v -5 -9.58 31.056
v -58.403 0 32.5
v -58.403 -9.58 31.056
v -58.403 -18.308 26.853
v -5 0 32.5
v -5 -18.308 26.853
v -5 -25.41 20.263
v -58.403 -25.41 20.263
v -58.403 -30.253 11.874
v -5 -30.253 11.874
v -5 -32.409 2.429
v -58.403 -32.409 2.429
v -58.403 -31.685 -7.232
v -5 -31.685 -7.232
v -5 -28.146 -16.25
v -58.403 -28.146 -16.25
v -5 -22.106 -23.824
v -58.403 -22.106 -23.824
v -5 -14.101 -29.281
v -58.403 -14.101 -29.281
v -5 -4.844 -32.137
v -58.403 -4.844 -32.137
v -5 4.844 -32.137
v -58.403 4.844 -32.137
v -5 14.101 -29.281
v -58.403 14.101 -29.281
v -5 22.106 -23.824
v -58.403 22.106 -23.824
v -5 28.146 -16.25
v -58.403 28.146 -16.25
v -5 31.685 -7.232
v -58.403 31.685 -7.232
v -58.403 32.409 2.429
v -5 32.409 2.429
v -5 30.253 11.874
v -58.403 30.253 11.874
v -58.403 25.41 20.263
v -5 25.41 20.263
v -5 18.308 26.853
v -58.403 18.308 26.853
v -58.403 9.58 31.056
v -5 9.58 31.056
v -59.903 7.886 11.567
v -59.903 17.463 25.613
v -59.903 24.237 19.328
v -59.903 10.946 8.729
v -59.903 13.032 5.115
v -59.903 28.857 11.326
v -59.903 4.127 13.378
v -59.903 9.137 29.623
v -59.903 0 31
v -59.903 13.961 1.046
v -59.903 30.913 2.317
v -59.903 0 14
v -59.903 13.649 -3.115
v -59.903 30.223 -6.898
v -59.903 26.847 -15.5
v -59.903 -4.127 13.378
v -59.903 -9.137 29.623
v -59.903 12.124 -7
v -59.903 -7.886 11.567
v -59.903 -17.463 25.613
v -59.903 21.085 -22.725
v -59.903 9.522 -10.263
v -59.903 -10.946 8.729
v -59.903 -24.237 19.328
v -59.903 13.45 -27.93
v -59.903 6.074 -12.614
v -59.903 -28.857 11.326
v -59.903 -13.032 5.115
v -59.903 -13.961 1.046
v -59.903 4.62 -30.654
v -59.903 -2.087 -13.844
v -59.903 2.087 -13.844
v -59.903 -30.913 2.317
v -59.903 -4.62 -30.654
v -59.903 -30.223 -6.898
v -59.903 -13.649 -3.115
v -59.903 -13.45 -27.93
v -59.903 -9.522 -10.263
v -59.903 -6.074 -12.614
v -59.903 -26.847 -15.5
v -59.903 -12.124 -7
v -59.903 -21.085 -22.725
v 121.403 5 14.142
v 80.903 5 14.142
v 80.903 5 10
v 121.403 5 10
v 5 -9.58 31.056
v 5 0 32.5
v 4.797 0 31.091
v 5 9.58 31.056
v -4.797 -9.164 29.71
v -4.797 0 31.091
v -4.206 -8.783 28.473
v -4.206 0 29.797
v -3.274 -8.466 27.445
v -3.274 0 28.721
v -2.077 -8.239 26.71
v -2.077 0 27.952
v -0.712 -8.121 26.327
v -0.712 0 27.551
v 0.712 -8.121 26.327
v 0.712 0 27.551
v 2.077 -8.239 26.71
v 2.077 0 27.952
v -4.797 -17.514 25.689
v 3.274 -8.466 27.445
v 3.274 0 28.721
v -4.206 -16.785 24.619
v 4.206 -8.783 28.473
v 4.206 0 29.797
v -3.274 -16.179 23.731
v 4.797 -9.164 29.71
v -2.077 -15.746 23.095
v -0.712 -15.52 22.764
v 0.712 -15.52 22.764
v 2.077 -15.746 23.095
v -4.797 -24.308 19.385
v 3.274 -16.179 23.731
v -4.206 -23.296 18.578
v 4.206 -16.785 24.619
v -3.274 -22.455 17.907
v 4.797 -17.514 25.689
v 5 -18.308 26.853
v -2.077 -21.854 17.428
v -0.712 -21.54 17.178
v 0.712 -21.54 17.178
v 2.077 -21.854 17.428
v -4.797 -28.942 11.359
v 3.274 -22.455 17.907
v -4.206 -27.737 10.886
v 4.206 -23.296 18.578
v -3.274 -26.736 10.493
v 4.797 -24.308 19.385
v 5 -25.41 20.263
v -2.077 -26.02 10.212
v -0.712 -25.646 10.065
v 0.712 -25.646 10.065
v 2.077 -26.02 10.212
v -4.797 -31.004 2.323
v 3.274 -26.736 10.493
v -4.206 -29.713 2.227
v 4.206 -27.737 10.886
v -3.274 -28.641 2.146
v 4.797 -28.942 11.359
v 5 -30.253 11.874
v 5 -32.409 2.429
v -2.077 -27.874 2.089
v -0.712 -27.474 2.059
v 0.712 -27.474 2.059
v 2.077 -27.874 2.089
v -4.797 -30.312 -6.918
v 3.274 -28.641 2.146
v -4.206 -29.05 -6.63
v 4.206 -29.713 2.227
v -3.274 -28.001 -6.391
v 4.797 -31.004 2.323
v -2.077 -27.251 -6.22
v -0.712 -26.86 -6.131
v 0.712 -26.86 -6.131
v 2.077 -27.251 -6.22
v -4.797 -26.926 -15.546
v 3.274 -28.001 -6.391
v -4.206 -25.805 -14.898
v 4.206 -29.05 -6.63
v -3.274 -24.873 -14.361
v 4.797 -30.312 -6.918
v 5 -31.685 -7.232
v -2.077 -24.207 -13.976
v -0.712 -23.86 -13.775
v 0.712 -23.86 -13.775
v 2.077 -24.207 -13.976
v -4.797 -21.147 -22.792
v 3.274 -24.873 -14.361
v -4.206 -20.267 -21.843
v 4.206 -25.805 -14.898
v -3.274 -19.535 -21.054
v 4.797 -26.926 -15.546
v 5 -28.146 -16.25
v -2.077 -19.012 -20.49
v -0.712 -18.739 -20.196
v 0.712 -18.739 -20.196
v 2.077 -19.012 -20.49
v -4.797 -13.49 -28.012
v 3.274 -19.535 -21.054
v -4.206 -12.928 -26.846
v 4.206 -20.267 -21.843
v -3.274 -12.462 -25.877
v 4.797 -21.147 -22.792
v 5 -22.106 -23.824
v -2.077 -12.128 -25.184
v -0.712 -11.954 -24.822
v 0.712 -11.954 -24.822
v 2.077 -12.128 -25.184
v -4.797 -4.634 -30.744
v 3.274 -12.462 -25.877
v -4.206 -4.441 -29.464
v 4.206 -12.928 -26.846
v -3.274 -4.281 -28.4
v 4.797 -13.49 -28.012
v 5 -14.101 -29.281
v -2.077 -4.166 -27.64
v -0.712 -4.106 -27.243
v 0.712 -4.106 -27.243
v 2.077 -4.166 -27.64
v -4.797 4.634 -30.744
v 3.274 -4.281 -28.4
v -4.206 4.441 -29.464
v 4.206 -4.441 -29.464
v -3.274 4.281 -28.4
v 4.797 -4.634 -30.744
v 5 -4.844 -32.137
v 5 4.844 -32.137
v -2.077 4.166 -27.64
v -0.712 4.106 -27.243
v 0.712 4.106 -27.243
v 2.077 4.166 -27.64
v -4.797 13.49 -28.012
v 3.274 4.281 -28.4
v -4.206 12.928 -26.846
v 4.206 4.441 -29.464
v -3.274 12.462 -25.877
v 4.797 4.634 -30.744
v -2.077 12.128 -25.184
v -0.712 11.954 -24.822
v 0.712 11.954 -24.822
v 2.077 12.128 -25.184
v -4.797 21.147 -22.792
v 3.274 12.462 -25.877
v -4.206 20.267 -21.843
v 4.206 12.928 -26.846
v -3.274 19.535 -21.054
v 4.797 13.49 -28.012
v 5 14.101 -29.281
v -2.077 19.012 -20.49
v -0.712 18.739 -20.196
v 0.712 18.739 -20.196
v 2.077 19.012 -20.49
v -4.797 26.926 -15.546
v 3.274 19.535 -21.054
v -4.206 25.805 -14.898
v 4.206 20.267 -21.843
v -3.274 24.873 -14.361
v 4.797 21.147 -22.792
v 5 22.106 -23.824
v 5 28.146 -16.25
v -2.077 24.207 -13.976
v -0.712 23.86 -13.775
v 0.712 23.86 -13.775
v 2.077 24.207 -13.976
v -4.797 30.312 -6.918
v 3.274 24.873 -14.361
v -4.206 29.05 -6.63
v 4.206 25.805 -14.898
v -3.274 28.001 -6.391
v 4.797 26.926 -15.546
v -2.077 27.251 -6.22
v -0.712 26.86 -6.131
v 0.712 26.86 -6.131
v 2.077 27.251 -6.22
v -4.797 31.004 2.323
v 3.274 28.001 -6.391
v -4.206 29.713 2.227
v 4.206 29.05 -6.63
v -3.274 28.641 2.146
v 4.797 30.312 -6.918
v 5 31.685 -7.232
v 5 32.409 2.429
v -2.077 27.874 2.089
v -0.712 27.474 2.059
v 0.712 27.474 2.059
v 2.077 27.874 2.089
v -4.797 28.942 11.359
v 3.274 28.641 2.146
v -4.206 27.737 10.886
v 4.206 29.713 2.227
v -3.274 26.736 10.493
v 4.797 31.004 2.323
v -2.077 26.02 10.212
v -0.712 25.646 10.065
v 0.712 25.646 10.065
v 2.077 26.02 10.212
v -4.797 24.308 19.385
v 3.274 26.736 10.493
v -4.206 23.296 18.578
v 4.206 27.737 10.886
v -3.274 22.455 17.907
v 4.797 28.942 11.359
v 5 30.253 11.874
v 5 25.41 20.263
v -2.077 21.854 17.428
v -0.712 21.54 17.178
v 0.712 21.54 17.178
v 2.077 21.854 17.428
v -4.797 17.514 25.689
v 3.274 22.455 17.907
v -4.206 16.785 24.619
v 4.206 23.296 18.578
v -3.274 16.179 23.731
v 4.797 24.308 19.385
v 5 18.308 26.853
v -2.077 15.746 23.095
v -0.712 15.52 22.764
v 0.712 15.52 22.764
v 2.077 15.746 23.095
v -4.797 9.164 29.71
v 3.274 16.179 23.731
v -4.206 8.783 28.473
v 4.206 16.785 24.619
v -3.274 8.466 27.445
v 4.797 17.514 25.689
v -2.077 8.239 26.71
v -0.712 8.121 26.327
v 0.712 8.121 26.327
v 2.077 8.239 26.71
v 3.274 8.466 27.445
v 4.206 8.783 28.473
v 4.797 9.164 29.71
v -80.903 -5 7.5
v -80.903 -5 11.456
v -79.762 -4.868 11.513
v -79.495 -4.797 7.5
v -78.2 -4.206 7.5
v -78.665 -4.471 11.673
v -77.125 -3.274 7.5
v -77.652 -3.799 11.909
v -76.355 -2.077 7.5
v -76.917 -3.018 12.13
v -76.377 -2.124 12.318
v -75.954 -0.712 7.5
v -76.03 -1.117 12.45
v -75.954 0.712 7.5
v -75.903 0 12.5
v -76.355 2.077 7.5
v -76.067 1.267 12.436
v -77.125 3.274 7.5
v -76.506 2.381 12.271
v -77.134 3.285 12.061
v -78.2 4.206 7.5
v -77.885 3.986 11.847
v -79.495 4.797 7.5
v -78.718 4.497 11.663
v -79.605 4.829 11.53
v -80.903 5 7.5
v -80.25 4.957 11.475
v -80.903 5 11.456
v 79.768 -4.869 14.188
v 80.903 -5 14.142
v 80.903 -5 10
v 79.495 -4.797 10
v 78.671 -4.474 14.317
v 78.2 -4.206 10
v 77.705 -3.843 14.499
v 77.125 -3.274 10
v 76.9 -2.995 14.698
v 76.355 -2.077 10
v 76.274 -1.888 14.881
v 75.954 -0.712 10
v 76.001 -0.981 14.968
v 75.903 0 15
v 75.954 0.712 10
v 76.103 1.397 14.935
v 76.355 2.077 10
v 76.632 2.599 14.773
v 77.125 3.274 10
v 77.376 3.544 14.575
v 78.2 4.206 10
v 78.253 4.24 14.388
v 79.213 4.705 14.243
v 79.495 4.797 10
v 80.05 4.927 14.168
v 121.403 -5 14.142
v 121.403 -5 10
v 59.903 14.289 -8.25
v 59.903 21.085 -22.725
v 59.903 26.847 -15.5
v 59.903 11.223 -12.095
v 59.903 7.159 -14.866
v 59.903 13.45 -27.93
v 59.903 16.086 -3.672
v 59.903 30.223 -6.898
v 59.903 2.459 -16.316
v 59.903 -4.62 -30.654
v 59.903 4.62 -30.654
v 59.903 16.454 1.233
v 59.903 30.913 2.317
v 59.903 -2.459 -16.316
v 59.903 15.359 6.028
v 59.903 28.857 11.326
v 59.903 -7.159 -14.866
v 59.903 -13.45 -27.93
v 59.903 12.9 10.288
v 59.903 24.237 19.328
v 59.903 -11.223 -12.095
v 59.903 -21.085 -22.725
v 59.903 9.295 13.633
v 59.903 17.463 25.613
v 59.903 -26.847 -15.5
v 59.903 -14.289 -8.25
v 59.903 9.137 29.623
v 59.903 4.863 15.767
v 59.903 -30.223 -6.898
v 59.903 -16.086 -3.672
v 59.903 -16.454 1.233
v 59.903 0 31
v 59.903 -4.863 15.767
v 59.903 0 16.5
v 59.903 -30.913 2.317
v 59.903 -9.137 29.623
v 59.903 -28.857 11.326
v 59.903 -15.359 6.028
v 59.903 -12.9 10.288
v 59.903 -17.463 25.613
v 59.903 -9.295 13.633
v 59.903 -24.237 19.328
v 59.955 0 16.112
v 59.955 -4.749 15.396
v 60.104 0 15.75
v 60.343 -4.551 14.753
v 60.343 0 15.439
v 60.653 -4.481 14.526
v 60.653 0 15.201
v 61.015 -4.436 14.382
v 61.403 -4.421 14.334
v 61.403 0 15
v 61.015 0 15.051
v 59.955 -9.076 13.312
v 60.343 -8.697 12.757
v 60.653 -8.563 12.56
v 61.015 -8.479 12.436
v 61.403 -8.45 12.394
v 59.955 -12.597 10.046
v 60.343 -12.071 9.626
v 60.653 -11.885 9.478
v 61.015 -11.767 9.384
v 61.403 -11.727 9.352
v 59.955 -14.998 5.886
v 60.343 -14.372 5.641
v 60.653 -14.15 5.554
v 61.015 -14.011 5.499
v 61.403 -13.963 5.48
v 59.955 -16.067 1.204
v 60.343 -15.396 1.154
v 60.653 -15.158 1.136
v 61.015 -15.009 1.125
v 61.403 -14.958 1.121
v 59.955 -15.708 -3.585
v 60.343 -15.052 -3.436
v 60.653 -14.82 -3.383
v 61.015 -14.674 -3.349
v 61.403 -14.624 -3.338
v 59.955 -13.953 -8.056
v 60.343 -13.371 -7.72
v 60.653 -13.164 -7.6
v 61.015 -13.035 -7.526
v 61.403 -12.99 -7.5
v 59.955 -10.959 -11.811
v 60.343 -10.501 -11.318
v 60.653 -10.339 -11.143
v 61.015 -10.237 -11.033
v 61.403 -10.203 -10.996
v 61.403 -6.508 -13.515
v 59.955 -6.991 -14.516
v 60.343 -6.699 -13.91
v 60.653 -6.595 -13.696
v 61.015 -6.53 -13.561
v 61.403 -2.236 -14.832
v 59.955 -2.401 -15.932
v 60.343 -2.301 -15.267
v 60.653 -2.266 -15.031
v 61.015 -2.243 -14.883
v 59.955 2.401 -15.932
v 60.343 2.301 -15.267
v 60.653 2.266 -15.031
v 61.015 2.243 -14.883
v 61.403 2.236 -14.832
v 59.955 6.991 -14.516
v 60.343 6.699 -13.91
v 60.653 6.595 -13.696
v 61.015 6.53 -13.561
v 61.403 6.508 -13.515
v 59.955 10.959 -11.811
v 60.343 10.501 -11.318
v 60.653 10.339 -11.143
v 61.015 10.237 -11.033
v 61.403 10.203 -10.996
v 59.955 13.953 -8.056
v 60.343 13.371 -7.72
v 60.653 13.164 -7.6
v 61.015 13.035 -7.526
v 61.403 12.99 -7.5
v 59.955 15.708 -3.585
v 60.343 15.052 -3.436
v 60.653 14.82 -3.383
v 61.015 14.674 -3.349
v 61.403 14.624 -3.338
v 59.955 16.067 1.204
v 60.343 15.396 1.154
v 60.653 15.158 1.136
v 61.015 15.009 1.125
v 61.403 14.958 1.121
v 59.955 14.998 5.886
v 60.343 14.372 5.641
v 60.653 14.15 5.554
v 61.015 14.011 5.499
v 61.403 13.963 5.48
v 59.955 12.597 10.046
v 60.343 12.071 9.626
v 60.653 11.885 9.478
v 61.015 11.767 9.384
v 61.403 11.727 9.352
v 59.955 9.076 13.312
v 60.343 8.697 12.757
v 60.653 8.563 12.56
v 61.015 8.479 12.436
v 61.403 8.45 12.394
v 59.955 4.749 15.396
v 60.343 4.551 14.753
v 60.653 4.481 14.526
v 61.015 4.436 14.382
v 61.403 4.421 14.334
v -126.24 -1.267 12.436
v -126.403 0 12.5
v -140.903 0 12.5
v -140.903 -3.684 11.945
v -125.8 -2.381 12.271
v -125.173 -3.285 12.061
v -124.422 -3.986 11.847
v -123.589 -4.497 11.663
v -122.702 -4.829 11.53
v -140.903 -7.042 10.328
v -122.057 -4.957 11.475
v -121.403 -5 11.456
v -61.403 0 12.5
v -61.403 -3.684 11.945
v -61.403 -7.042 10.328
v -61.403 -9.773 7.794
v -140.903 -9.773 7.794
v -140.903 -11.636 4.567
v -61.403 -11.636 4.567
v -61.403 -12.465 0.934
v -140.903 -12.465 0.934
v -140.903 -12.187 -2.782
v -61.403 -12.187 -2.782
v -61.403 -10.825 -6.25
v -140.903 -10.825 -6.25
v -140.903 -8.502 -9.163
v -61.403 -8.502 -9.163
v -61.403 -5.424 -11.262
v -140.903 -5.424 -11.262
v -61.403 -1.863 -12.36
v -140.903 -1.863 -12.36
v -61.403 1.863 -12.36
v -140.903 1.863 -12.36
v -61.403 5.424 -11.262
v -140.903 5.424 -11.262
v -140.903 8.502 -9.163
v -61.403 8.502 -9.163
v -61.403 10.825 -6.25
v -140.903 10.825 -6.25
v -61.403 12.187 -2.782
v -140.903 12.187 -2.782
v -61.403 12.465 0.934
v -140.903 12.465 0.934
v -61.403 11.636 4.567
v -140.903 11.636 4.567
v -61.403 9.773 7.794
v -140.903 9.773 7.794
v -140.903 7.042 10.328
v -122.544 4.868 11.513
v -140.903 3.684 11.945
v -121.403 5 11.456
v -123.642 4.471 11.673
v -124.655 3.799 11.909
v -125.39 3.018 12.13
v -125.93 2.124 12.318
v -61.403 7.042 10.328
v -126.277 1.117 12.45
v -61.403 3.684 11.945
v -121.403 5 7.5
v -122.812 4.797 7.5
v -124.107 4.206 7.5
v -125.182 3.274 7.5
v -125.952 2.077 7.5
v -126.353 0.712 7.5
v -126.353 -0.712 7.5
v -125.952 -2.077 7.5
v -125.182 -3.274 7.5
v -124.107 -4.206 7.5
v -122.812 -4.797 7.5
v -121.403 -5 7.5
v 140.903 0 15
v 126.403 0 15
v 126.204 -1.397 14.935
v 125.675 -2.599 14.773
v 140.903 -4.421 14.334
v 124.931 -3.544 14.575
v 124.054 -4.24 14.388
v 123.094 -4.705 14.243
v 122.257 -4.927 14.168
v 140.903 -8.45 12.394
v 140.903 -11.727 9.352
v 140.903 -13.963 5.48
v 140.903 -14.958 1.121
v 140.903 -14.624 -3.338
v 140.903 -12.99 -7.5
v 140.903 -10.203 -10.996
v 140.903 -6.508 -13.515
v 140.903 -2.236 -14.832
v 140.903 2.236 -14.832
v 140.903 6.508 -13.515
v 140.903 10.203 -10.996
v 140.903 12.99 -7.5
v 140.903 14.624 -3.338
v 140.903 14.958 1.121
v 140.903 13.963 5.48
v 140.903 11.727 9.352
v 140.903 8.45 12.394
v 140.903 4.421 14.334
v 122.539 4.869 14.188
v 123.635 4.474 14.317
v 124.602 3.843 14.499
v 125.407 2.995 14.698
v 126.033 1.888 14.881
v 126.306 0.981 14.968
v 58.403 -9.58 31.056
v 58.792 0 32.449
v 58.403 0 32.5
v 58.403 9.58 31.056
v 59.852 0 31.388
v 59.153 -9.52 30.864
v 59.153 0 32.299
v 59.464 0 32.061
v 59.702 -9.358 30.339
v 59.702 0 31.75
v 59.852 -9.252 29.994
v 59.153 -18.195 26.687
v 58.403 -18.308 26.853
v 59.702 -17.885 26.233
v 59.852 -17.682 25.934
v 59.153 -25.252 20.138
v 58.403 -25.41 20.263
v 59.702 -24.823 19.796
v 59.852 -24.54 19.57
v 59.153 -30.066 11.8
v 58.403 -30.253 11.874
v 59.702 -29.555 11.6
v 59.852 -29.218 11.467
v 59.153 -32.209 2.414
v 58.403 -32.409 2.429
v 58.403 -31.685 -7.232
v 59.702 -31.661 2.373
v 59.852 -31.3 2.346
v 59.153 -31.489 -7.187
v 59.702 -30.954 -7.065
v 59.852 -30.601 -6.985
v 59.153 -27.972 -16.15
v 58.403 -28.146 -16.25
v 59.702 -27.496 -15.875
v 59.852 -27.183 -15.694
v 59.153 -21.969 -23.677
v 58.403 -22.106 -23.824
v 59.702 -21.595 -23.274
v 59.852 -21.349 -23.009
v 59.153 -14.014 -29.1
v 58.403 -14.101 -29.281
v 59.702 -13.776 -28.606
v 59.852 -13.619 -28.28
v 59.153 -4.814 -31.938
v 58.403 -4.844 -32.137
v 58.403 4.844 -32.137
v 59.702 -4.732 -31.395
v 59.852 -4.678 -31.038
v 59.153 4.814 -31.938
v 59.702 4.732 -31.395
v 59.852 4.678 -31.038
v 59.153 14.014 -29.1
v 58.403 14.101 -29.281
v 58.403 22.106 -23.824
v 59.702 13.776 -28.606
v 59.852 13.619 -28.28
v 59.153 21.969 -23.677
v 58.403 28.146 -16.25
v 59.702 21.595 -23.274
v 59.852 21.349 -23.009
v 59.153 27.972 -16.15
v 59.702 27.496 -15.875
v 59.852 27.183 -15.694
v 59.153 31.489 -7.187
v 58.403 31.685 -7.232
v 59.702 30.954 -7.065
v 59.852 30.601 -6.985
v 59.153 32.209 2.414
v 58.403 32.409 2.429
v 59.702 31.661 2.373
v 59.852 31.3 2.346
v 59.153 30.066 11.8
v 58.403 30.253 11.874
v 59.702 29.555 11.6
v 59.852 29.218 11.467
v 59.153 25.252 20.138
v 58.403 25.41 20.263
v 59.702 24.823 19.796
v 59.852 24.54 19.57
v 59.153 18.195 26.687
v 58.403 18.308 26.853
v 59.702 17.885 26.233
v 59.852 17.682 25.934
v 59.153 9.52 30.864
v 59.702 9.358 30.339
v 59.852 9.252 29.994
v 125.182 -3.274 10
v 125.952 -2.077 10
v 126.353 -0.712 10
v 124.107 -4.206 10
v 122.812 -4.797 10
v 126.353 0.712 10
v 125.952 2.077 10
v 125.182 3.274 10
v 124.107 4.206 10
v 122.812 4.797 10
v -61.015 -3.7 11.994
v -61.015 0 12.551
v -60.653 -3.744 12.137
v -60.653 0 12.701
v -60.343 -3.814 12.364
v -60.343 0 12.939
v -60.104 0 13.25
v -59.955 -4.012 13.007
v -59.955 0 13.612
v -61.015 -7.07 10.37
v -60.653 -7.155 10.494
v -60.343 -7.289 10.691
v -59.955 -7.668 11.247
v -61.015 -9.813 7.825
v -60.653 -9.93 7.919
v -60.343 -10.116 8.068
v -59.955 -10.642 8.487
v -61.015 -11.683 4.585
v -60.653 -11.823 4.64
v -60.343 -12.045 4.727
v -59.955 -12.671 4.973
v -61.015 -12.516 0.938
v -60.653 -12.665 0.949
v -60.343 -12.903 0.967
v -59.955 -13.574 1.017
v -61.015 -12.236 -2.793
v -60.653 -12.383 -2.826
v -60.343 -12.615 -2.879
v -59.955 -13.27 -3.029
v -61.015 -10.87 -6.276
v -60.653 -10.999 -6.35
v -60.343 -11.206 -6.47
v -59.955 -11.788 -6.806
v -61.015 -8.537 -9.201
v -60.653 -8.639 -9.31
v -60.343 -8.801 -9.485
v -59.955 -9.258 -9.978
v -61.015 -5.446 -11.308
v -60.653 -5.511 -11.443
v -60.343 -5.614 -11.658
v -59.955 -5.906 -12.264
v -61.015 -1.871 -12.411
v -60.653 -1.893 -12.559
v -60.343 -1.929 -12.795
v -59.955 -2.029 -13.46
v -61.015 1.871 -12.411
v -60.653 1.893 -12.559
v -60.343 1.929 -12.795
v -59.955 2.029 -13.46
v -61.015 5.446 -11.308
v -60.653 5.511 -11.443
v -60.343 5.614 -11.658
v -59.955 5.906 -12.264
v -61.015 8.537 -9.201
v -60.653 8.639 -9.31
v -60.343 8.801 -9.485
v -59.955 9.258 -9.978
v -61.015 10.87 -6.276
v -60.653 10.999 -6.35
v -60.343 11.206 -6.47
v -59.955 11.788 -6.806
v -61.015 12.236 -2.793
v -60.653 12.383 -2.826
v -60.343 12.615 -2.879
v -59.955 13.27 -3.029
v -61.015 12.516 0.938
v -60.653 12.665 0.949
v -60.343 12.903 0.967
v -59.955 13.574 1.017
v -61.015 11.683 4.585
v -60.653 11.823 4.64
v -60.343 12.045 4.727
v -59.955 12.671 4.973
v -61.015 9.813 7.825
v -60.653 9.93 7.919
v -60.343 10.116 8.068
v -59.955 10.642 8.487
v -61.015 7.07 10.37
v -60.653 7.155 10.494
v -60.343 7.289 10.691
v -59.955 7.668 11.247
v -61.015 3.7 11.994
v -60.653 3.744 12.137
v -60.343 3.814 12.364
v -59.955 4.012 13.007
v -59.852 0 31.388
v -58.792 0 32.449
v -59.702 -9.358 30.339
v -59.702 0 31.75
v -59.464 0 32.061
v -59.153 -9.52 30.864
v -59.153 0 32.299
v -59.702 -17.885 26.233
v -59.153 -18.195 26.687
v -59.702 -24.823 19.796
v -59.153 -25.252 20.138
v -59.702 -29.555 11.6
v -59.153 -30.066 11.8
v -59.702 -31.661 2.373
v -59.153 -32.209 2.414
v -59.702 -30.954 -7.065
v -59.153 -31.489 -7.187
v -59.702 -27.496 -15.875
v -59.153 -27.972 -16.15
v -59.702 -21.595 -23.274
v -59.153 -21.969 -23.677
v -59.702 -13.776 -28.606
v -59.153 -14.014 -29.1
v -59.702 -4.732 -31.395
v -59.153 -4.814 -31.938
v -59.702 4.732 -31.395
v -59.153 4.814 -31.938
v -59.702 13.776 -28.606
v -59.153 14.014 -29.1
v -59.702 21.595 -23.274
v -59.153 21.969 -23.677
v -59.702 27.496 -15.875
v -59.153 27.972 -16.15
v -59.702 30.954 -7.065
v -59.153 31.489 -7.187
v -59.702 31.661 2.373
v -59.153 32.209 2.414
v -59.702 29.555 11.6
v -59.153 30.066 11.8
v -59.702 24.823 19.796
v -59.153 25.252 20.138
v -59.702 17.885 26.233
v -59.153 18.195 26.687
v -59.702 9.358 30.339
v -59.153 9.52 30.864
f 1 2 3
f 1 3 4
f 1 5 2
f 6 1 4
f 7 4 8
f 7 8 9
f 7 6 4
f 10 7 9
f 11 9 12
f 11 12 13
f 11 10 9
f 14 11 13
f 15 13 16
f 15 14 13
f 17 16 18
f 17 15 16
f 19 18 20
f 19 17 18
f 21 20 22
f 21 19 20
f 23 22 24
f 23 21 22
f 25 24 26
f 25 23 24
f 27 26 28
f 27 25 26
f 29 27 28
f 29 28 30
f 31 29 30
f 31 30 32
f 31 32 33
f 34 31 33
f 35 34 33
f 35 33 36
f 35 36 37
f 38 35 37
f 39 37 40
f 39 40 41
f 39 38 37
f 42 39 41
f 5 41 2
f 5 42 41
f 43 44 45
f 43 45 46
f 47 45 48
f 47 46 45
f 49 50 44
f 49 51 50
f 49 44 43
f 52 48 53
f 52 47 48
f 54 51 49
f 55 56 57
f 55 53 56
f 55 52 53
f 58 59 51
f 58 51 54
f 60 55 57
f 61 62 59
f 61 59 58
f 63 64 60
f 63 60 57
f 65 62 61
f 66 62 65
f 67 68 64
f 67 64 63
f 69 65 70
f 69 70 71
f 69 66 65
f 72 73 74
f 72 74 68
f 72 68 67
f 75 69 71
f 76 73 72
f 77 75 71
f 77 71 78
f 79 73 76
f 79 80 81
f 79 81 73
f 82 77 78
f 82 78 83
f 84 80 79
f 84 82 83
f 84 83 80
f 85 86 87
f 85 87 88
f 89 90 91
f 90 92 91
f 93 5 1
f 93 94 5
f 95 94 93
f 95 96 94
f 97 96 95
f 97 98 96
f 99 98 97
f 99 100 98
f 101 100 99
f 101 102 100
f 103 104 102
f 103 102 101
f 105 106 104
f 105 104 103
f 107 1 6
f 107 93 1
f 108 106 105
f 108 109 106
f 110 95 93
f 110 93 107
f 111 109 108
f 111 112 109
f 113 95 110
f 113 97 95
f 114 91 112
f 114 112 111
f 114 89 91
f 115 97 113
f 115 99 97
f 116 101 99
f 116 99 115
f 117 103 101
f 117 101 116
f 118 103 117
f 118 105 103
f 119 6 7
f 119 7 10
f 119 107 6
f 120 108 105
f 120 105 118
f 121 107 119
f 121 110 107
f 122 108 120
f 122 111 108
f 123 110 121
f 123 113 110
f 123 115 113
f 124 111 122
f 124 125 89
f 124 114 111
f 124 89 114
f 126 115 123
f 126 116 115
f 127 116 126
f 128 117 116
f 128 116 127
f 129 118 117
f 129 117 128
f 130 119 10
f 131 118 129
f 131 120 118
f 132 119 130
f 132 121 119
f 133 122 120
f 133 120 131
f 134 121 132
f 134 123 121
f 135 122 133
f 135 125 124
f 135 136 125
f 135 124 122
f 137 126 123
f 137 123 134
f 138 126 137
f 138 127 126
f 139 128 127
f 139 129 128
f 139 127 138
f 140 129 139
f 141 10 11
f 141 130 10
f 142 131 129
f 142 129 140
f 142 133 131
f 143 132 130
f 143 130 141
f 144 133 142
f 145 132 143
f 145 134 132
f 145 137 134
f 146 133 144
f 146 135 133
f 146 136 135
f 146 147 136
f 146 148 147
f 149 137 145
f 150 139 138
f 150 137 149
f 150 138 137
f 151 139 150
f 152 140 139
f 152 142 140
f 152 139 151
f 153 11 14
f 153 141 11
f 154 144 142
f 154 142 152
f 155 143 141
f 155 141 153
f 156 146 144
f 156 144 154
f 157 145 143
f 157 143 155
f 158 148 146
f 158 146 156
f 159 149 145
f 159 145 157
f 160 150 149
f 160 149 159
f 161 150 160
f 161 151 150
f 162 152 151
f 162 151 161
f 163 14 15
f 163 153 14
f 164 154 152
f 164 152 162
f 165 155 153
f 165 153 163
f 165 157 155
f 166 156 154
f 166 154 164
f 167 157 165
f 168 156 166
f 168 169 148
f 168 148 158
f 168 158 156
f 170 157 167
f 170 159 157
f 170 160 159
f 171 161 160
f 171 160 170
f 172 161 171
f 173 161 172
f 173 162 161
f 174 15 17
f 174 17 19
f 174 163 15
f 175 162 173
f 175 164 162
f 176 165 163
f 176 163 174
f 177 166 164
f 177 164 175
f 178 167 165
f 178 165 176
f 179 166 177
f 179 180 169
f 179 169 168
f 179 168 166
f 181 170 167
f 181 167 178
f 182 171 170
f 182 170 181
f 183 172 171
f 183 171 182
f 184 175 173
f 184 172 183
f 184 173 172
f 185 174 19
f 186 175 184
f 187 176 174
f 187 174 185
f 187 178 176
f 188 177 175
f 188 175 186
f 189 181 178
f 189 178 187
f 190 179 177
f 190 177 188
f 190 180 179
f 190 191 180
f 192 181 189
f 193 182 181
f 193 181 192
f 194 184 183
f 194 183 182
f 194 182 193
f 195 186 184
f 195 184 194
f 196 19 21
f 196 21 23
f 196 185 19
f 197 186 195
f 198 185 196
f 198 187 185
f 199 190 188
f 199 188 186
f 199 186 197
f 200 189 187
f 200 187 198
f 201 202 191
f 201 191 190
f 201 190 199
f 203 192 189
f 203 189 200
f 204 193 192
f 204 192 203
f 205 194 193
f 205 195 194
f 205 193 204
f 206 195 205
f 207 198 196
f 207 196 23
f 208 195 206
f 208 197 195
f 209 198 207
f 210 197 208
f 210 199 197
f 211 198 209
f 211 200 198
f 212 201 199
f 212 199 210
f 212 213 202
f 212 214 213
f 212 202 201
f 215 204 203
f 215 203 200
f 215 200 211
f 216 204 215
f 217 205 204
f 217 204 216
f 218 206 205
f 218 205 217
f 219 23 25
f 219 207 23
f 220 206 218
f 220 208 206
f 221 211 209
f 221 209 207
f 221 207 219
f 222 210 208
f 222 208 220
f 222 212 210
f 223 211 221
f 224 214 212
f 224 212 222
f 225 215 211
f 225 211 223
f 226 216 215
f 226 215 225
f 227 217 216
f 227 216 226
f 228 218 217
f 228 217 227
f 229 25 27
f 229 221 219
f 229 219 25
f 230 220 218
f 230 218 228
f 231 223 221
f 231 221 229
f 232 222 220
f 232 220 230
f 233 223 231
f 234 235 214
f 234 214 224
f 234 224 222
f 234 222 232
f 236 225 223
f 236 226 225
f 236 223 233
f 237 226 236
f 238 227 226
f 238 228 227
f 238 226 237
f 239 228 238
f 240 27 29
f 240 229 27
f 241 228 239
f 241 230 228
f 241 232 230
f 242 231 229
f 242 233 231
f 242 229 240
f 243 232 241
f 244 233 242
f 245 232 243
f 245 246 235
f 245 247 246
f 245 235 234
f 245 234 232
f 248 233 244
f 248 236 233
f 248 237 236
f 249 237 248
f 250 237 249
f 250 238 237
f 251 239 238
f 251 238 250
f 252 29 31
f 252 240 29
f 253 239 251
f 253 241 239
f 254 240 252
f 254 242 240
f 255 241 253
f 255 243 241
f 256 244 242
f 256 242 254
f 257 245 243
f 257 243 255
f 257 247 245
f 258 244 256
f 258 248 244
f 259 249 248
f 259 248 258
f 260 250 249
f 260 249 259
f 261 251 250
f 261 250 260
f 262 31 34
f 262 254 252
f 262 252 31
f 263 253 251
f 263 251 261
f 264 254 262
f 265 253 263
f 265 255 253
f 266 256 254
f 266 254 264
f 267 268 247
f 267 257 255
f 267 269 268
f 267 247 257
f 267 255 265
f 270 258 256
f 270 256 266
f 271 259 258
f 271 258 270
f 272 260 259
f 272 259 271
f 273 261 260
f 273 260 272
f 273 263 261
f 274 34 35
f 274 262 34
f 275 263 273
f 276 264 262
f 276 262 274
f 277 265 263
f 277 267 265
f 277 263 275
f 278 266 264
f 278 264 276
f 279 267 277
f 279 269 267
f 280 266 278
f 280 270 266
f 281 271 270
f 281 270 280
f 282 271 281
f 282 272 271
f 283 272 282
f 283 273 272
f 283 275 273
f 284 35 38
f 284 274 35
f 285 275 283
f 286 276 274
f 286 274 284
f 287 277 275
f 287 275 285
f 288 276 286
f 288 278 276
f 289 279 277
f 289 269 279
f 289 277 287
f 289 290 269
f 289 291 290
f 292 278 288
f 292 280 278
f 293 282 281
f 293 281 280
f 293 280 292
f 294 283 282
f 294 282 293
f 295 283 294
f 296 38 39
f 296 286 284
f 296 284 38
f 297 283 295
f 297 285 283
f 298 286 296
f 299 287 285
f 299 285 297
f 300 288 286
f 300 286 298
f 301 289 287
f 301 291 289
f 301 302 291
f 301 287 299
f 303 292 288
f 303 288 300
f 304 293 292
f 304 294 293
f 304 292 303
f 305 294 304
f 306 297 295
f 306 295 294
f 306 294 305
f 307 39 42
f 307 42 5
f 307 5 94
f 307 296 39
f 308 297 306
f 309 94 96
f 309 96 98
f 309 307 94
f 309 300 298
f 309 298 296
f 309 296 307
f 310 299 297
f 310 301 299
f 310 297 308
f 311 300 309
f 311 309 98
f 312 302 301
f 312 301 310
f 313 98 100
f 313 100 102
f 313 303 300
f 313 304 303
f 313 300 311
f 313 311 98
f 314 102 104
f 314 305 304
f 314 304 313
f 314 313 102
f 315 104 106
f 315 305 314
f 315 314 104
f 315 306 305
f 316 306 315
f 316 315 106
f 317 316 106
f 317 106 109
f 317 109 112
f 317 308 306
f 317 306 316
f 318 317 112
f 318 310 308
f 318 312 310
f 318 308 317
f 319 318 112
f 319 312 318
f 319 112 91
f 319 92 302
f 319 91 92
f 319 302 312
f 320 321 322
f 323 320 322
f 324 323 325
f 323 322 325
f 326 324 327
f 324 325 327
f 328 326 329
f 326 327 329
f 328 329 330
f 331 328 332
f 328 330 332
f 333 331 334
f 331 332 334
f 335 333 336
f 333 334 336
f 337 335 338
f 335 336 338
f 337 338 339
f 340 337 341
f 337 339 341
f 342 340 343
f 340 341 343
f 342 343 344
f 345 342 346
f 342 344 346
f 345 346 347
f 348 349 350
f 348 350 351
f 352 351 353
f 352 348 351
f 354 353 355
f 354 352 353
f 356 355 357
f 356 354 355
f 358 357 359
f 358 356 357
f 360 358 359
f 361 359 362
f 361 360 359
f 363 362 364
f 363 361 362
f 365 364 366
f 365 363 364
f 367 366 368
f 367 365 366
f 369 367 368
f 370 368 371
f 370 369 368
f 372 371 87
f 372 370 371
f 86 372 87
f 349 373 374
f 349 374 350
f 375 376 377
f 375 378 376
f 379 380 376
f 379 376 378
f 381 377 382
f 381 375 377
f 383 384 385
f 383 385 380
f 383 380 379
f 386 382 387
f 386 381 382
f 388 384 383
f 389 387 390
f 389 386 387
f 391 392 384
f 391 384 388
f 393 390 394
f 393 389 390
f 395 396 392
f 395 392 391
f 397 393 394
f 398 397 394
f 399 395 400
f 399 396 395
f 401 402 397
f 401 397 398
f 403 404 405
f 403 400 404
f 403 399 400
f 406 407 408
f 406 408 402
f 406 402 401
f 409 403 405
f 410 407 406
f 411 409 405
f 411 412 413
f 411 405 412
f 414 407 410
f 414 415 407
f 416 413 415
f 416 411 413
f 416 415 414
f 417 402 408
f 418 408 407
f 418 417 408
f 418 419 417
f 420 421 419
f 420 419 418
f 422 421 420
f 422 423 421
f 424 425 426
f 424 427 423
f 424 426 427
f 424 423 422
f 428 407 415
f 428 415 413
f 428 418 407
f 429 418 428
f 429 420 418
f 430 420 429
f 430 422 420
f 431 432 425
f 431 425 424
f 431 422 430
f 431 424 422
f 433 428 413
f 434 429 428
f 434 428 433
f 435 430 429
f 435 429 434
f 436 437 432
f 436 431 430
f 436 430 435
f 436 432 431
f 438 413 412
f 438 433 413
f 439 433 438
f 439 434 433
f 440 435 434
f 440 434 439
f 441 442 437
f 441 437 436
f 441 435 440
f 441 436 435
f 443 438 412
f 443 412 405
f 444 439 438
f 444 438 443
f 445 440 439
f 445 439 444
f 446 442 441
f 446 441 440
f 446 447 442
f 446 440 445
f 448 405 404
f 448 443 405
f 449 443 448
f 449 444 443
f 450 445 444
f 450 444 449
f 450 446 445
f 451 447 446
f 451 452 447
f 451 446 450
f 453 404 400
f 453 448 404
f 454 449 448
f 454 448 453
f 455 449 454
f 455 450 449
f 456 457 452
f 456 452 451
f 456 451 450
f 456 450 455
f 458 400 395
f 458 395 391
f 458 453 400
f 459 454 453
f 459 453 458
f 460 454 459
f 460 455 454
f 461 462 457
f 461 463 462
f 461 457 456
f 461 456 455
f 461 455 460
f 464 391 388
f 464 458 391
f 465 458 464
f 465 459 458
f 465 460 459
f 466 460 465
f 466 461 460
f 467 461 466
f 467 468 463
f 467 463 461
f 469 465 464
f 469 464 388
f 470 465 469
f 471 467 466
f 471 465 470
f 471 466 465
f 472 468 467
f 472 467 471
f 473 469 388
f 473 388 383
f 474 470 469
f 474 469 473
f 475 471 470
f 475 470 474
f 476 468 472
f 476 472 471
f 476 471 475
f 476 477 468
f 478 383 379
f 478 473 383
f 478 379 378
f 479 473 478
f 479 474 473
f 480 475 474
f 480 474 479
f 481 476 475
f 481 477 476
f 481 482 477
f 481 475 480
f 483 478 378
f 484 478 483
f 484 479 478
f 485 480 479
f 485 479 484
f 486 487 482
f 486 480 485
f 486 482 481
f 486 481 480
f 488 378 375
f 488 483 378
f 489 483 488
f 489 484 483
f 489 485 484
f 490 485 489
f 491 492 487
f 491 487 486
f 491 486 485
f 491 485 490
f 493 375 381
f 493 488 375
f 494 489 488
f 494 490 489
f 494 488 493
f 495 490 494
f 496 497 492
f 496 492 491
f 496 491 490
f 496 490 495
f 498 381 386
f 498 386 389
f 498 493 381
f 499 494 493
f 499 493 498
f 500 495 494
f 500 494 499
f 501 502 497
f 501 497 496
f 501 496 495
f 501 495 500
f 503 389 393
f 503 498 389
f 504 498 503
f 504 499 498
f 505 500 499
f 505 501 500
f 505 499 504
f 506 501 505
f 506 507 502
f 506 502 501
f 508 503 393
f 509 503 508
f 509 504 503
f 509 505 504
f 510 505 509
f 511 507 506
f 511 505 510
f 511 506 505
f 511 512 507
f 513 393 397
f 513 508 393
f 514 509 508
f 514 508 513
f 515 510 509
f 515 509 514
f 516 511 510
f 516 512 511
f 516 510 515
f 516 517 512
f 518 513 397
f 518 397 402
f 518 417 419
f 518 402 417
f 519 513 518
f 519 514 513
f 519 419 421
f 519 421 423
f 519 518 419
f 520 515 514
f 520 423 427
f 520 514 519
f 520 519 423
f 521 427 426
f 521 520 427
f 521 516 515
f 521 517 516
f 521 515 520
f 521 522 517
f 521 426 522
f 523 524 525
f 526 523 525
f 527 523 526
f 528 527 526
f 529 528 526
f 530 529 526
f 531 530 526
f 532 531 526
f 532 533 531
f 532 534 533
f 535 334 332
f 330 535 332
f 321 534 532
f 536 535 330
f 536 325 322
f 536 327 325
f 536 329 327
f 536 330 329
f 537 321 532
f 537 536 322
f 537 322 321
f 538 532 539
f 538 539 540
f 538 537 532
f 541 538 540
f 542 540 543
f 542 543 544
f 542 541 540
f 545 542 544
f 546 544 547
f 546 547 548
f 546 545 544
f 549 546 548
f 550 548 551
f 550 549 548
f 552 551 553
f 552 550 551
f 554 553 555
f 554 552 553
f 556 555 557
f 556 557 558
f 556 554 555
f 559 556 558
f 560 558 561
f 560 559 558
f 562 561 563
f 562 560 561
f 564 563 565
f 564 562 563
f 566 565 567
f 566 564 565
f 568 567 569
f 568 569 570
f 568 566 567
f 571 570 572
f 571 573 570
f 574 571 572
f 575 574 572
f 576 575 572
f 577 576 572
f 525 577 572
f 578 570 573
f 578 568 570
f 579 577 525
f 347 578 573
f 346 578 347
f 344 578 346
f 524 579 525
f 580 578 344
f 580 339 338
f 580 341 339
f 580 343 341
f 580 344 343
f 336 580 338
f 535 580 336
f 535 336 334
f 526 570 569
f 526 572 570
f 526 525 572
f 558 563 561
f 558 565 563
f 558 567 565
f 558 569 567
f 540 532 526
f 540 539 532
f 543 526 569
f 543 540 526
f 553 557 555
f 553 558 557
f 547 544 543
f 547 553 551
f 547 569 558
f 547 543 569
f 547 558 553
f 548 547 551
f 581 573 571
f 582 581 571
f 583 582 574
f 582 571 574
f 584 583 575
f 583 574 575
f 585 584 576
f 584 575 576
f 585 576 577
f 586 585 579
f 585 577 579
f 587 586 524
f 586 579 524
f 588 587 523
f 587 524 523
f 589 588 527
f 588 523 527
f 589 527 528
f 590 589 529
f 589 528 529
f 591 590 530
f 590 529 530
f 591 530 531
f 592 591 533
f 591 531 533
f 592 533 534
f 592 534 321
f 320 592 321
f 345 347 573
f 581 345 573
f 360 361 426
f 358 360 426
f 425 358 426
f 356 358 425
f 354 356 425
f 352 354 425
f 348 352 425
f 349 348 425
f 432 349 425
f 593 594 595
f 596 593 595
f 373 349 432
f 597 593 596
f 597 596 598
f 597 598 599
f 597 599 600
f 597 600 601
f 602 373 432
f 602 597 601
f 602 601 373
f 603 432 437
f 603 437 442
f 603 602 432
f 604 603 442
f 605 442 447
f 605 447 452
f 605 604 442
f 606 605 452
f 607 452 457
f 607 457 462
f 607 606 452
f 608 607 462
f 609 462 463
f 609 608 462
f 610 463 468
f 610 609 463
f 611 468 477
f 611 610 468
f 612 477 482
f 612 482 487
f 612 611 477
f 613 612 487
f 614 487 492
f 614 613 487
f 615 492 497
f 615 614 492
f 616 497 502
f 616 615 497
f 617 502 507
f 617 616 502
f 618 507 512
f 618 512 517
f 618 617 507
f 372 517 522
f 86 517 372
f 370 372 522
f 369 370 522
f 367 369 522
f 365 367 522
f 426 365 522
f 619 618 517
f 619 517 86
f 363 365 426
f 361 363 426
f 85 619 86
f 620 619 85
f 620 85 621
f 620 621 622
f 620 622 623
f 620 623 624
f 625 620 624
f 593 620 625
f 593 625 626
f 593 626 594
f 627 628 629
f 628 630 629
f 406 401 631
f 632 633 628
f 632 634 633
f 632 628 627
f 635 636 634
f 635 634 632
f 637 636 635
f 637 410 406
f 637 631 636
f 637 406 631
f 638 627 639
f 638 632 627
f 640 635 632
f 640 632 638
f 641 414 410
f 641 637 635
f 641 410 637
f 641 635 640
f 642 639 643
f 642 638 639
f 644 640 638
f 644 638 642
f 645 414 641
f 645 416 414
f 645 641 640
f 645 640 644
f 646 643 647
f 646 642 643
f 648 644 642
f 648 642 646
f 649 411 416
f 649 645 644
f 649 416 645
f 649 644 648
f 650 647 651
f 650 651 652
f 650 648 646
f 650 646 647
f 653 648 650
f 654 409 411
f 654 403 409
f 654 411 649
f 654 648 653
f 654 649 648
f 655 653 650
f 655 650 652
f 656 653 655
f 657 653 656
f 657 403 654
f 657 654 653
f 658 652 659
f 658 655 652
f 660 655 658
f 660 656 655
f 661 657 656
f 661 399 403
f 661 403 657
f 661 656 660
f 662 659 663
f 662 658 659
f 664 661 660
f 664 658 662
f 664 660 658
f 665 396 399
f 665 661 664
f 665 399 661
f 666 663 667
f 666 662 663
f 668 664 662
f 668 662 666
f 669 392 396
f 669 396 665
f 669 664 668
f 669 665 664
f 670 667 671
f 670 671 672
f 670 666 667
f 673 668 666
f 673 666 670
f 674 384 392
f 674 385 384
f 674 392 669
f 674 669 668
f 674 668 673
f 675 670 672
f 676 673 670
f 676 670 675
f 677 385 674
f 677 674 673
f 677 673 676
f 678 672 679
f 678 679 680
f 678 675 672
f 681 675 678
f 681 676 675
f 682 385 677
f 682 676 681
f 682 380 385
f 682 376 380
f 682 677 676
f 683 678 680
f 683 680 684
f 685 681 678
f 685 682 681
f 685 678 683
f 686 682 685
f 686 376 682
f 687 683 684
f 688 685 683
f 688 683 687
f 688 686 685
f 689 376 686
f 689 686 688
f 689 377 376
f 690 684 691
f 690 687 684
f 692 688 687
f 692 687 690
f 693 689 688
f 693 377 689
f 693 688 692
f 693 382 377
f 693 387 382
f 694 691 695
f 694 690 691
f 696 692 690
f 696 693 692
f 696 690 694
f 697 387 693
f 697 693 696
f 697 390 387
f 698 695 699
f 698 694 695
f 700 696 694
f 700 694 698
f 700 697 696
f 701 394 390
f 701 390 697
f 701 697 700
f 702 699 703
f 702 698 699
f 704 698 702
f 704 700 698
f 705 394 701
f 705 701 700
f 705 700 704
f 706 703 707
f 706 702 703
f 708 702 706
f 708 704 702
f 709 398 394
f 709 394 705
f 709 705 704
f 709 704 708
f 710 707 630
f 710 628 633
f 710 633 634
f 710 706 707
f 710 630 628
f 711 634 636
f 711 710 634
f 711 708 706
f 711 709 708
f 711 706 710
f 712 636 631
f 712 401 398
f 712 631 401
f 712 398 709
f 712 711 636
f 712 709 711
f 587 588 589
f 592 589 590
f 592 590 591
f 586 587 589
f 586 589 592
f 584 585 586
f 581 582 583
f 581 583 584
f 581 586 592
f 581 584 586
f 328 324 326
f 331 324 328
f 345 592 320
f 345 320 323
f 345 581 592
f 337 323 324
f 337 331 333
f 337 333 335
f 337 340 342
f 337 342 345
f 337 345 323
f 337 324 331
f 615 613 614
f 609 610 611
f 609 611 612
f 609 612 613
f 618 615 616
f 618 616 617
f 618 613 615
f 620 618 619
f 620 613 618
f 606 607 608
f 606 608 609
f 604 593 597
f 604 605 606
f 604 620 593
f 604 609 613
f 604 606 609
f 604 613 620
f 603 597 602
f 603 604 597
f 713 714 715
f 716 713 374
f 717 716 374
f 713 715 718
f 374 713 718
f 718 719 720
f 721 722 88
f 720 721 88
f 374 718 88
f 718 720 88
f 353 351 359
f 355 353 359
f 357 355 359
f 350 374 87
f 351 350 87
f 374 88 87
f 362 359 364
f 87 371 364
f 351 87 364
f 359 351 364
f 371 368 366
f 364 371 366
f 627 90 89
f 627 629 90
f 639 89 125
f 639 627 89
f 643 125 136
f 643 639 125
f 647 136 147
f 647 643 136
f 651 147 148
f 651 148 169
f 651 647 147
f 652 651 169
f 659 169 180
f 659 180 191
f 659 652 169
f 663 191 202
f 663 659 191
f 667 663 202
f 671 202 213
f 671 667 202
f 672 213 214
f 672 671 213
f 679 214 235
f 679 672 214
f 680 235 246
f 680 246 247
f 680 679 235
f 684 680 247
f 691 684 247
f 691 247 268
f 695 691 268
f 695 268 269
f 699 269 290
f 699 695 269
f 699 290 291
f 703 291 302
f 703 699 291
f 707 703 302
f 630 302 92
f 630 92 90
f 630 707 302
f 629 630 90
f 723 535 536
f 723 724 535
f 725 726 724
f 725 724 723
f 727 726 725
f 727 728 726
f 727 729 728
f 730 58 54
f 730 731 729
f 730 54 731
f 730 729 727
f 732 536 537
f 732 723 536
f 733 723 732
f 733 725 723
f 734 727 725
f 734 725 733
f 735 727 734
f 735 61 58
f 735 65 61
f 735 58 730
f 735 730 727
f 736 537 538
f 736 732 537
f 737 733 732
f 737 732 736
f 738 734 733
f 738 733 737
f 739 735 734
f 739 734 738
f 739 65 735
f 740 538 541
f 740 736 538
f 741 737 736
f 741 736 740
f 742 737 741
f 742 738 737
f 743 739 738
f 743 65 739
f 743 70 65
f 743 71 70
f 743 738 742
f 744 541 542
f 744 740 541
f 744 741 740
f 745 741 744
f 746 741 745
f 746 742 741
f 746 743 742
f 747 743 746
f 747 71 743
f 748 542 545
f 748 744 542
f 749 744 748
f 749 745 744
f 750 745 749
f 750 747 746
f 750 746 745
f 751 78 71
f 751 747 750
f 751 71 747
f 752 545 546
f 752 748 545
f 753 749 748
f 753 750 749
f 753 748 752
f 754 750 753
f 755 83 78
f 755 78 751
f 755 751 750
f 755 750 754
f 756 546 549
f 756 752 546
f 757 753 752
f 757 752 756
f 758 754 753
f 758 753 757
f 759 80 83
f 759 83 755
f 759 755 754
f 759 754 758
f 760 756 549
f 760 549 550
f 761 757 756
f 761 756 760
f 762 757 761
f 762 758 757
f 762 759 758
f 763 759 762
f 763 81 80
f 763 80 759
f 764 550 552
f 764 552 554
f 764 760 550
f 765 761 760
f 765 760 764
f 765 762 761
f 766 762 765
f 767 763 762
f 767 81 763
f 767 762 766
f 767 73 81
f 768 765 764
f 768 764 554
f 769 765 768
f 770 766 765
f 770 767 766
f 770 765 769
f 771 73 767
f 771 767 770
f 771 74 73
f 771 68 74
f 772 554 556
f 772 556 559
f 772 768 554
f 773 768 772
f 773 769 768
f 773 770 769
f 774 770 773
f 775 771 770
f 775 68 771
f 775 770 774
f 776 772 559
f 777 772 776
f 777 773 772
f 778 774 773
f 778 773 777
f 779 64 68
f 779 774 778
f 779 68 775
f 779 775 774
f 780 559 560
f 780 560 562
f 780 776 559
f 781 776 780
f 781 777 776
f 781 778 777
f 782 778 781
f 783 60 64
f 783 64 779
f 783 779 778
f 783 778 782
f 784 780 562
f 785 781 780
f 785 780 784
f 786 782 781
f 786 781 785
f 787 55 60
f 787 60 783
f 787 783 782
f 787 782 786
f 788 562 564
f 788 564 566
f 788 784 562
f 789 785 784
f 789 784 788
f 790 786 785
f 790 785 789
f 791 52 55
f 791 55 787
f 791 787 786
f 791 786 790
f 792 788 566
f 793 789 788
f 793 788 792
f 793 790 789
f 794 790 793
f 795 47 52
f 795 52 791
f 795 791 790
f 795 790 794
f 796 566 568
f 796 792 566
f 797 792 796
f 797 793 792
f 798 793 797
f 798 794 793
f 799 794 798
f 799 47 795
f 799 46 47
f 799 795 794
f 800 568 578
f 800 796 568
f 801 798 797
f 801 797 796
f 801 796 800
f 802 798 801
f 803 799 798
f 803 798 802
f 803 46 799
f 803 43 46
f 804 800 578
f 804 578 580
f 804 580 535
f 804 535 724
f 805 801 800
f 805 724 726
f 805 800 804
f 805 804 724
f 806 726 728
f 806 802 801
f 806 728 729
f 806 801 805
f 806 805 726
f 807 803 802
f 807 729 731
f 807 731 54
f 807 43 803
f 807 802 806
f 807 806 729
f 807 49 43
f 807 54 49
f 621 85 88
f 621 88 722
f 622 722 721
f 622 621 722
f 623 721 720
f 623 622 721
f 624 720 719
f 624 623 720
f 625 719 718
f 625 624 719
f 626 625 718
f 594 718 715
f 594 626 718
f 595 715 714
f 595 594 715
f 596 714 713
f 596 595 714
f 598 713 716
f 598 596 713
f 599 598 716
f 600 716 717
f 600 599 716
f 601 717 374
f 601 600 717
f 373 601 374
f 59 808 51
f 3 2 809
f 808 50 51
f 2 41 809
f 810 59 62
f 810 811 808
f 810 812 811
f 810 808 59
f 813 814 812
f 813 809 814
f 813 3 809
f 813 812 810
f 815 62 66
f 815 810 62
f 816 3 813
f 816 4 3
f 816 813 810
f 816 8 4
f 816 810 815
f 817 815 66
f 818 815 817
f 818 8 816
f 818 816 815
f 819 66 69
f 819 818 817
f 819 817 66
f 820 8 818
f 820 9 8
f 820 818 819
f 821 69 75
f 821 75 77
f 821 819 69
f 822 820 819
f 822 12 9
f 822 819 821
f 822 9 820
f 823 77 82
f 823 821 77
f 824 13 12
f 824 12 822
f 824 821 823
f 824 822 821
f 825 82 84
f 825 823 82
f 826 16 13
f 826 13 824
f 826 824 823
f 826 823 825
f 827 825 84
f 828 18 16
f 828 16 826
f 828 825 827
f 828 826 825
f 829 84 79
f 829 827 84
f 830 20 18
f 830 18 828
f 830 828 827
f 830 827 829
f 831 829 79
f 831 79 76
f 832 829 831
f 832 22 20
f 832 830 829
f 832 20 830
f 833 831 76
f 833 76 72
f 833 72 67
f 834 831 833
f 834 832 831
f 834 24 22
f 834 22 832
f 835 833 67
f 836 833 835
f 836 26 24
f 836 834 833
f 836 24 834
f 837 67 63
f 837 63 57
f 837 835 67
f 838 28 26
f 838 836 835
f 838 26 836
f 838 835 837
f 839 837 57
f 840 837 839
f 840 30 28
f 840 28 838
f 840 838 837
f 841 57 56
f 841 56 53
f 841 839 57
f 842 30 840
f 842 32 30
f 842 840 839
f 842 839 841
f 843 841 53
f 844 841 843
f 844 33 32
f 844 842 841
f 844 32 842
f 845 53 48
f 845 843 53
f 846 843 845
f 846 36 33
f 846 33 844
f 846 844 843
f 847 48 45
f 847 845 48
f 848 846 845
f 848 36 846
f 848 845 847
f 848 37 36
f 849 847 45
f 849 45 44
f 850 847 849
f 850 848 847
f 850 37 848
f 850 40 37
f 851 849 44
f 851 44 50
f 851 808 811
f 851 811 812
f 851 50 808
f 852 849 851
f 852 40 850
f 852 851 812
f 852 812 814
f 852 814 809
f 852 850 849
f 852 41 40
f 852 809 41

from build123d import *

# Parameters (mm, degrees)
CORTAR_EXTRUIR2_START = 12.5
CORTAR_EXTRUIR2_DEPTH = 5
CORTAR_EXTRUIR3_START = 15
CORTAR_EXTRUIR3_DEPTH = 5


with BuildPart() as part:
    # Croquis4 → Revolución2 (revolve)
    with BuildSketch(Plane(origin=(0, 0, 0), x_dir=(1, 0, 0), z_dir=(0, 1, 0)), mode=Mode.PRIVATE) as revoluci_n2_sk:
        with BuildLine():
            Line((-140.903426942, 0), (-140.903426942, 12.5))
            Line((-140.903426942, 12.5), (-61.403426942, 12.5))
            ThreePointArc((-61.403426942, 12.5), (-60.34276677, 12.939339828), (-59.903426942, 14))
            Line((-59.903426942, 14), (-59.903426942, 31))
            ThreePointArc((-59.903426942, 31), (-59.464087114, 32.060660172), (-58.403426942, 32.5))
            Line((-58.403426942, 32.5), (-5, 32.5))
            ThreePointArc((-5, 32.5), (0, 27.5), (5, 32.5))
            Line((5, 32.5), (58.403426942, 32.5))
            ThreePointArc((58.403426942, 32.5), (59.464087114, 32.060660172), (59.903426942, 31))
            Line((59.903426942, 31), (59.903426942, 16.5))
            ThreePointArc((59.903426942, 16.5), (60.34276677, 15.439339828), (61.403426942, 15))
            Line((61.403426942, 15), (140.903426942, 15))
            Line((140.903426942, 15), (140.903426942, 0))
            Line((140.903426942, 0), (-140.903426942, 0))
        make_face()
    revolve(revoluci_n2_sk.sketch.rotate(Axis((-140.903426942, 0, 0), (1, 0, 0)), 180), axis=Axis((-140.903426942, 0, 0), (1, 0, 0)))

    # Croquis5 → Cortar-Extruir2 (cut)
    with BuildSketch(Plane.XY.offset(CORTAR_EXTRUIR2_START)):
        with BuildLine():
            Line((-121.403426942, -5), (-80.903426942, -5))
            ThreePointArc((-80.903426942, -5), (-75.903426942, 0), (-80.903426942, 5))
            Line((-80.903426942, 5), (-121.403426942, 5))
            ThreePointArc((-121.403426942, 5), (-126.403426942, 0), (-121.403426942, -5))
        make_face()
    extrude(amount=-CORTAR_EXTRUIR2_DEPTH, mode=Mode.SUBTRACT)

    # Croquis6 → Cortar-Extruir3 (cut)
    with BuildSketch(Plane.XY.offset(CORTAR_EXTRUIR3_START)):
        with BuildLine():
            Line((80.903426942, 5), (121.403426942, 5))
            ThreePointArc((121.403426942, 5), (126.403426942, 0), (121.403426942, -5))
            Line((121.403426942, -5), (80.903426942, -5))
            ThreePointArc((80.903426942, -5), (75.903426942, 0), (80.903426942, 5))
        make_face()
    extrude(amount=-CORTAR_EXTRUIR3_DEPTH, mode=Mode.SUBTRACT)


solid = part.part
